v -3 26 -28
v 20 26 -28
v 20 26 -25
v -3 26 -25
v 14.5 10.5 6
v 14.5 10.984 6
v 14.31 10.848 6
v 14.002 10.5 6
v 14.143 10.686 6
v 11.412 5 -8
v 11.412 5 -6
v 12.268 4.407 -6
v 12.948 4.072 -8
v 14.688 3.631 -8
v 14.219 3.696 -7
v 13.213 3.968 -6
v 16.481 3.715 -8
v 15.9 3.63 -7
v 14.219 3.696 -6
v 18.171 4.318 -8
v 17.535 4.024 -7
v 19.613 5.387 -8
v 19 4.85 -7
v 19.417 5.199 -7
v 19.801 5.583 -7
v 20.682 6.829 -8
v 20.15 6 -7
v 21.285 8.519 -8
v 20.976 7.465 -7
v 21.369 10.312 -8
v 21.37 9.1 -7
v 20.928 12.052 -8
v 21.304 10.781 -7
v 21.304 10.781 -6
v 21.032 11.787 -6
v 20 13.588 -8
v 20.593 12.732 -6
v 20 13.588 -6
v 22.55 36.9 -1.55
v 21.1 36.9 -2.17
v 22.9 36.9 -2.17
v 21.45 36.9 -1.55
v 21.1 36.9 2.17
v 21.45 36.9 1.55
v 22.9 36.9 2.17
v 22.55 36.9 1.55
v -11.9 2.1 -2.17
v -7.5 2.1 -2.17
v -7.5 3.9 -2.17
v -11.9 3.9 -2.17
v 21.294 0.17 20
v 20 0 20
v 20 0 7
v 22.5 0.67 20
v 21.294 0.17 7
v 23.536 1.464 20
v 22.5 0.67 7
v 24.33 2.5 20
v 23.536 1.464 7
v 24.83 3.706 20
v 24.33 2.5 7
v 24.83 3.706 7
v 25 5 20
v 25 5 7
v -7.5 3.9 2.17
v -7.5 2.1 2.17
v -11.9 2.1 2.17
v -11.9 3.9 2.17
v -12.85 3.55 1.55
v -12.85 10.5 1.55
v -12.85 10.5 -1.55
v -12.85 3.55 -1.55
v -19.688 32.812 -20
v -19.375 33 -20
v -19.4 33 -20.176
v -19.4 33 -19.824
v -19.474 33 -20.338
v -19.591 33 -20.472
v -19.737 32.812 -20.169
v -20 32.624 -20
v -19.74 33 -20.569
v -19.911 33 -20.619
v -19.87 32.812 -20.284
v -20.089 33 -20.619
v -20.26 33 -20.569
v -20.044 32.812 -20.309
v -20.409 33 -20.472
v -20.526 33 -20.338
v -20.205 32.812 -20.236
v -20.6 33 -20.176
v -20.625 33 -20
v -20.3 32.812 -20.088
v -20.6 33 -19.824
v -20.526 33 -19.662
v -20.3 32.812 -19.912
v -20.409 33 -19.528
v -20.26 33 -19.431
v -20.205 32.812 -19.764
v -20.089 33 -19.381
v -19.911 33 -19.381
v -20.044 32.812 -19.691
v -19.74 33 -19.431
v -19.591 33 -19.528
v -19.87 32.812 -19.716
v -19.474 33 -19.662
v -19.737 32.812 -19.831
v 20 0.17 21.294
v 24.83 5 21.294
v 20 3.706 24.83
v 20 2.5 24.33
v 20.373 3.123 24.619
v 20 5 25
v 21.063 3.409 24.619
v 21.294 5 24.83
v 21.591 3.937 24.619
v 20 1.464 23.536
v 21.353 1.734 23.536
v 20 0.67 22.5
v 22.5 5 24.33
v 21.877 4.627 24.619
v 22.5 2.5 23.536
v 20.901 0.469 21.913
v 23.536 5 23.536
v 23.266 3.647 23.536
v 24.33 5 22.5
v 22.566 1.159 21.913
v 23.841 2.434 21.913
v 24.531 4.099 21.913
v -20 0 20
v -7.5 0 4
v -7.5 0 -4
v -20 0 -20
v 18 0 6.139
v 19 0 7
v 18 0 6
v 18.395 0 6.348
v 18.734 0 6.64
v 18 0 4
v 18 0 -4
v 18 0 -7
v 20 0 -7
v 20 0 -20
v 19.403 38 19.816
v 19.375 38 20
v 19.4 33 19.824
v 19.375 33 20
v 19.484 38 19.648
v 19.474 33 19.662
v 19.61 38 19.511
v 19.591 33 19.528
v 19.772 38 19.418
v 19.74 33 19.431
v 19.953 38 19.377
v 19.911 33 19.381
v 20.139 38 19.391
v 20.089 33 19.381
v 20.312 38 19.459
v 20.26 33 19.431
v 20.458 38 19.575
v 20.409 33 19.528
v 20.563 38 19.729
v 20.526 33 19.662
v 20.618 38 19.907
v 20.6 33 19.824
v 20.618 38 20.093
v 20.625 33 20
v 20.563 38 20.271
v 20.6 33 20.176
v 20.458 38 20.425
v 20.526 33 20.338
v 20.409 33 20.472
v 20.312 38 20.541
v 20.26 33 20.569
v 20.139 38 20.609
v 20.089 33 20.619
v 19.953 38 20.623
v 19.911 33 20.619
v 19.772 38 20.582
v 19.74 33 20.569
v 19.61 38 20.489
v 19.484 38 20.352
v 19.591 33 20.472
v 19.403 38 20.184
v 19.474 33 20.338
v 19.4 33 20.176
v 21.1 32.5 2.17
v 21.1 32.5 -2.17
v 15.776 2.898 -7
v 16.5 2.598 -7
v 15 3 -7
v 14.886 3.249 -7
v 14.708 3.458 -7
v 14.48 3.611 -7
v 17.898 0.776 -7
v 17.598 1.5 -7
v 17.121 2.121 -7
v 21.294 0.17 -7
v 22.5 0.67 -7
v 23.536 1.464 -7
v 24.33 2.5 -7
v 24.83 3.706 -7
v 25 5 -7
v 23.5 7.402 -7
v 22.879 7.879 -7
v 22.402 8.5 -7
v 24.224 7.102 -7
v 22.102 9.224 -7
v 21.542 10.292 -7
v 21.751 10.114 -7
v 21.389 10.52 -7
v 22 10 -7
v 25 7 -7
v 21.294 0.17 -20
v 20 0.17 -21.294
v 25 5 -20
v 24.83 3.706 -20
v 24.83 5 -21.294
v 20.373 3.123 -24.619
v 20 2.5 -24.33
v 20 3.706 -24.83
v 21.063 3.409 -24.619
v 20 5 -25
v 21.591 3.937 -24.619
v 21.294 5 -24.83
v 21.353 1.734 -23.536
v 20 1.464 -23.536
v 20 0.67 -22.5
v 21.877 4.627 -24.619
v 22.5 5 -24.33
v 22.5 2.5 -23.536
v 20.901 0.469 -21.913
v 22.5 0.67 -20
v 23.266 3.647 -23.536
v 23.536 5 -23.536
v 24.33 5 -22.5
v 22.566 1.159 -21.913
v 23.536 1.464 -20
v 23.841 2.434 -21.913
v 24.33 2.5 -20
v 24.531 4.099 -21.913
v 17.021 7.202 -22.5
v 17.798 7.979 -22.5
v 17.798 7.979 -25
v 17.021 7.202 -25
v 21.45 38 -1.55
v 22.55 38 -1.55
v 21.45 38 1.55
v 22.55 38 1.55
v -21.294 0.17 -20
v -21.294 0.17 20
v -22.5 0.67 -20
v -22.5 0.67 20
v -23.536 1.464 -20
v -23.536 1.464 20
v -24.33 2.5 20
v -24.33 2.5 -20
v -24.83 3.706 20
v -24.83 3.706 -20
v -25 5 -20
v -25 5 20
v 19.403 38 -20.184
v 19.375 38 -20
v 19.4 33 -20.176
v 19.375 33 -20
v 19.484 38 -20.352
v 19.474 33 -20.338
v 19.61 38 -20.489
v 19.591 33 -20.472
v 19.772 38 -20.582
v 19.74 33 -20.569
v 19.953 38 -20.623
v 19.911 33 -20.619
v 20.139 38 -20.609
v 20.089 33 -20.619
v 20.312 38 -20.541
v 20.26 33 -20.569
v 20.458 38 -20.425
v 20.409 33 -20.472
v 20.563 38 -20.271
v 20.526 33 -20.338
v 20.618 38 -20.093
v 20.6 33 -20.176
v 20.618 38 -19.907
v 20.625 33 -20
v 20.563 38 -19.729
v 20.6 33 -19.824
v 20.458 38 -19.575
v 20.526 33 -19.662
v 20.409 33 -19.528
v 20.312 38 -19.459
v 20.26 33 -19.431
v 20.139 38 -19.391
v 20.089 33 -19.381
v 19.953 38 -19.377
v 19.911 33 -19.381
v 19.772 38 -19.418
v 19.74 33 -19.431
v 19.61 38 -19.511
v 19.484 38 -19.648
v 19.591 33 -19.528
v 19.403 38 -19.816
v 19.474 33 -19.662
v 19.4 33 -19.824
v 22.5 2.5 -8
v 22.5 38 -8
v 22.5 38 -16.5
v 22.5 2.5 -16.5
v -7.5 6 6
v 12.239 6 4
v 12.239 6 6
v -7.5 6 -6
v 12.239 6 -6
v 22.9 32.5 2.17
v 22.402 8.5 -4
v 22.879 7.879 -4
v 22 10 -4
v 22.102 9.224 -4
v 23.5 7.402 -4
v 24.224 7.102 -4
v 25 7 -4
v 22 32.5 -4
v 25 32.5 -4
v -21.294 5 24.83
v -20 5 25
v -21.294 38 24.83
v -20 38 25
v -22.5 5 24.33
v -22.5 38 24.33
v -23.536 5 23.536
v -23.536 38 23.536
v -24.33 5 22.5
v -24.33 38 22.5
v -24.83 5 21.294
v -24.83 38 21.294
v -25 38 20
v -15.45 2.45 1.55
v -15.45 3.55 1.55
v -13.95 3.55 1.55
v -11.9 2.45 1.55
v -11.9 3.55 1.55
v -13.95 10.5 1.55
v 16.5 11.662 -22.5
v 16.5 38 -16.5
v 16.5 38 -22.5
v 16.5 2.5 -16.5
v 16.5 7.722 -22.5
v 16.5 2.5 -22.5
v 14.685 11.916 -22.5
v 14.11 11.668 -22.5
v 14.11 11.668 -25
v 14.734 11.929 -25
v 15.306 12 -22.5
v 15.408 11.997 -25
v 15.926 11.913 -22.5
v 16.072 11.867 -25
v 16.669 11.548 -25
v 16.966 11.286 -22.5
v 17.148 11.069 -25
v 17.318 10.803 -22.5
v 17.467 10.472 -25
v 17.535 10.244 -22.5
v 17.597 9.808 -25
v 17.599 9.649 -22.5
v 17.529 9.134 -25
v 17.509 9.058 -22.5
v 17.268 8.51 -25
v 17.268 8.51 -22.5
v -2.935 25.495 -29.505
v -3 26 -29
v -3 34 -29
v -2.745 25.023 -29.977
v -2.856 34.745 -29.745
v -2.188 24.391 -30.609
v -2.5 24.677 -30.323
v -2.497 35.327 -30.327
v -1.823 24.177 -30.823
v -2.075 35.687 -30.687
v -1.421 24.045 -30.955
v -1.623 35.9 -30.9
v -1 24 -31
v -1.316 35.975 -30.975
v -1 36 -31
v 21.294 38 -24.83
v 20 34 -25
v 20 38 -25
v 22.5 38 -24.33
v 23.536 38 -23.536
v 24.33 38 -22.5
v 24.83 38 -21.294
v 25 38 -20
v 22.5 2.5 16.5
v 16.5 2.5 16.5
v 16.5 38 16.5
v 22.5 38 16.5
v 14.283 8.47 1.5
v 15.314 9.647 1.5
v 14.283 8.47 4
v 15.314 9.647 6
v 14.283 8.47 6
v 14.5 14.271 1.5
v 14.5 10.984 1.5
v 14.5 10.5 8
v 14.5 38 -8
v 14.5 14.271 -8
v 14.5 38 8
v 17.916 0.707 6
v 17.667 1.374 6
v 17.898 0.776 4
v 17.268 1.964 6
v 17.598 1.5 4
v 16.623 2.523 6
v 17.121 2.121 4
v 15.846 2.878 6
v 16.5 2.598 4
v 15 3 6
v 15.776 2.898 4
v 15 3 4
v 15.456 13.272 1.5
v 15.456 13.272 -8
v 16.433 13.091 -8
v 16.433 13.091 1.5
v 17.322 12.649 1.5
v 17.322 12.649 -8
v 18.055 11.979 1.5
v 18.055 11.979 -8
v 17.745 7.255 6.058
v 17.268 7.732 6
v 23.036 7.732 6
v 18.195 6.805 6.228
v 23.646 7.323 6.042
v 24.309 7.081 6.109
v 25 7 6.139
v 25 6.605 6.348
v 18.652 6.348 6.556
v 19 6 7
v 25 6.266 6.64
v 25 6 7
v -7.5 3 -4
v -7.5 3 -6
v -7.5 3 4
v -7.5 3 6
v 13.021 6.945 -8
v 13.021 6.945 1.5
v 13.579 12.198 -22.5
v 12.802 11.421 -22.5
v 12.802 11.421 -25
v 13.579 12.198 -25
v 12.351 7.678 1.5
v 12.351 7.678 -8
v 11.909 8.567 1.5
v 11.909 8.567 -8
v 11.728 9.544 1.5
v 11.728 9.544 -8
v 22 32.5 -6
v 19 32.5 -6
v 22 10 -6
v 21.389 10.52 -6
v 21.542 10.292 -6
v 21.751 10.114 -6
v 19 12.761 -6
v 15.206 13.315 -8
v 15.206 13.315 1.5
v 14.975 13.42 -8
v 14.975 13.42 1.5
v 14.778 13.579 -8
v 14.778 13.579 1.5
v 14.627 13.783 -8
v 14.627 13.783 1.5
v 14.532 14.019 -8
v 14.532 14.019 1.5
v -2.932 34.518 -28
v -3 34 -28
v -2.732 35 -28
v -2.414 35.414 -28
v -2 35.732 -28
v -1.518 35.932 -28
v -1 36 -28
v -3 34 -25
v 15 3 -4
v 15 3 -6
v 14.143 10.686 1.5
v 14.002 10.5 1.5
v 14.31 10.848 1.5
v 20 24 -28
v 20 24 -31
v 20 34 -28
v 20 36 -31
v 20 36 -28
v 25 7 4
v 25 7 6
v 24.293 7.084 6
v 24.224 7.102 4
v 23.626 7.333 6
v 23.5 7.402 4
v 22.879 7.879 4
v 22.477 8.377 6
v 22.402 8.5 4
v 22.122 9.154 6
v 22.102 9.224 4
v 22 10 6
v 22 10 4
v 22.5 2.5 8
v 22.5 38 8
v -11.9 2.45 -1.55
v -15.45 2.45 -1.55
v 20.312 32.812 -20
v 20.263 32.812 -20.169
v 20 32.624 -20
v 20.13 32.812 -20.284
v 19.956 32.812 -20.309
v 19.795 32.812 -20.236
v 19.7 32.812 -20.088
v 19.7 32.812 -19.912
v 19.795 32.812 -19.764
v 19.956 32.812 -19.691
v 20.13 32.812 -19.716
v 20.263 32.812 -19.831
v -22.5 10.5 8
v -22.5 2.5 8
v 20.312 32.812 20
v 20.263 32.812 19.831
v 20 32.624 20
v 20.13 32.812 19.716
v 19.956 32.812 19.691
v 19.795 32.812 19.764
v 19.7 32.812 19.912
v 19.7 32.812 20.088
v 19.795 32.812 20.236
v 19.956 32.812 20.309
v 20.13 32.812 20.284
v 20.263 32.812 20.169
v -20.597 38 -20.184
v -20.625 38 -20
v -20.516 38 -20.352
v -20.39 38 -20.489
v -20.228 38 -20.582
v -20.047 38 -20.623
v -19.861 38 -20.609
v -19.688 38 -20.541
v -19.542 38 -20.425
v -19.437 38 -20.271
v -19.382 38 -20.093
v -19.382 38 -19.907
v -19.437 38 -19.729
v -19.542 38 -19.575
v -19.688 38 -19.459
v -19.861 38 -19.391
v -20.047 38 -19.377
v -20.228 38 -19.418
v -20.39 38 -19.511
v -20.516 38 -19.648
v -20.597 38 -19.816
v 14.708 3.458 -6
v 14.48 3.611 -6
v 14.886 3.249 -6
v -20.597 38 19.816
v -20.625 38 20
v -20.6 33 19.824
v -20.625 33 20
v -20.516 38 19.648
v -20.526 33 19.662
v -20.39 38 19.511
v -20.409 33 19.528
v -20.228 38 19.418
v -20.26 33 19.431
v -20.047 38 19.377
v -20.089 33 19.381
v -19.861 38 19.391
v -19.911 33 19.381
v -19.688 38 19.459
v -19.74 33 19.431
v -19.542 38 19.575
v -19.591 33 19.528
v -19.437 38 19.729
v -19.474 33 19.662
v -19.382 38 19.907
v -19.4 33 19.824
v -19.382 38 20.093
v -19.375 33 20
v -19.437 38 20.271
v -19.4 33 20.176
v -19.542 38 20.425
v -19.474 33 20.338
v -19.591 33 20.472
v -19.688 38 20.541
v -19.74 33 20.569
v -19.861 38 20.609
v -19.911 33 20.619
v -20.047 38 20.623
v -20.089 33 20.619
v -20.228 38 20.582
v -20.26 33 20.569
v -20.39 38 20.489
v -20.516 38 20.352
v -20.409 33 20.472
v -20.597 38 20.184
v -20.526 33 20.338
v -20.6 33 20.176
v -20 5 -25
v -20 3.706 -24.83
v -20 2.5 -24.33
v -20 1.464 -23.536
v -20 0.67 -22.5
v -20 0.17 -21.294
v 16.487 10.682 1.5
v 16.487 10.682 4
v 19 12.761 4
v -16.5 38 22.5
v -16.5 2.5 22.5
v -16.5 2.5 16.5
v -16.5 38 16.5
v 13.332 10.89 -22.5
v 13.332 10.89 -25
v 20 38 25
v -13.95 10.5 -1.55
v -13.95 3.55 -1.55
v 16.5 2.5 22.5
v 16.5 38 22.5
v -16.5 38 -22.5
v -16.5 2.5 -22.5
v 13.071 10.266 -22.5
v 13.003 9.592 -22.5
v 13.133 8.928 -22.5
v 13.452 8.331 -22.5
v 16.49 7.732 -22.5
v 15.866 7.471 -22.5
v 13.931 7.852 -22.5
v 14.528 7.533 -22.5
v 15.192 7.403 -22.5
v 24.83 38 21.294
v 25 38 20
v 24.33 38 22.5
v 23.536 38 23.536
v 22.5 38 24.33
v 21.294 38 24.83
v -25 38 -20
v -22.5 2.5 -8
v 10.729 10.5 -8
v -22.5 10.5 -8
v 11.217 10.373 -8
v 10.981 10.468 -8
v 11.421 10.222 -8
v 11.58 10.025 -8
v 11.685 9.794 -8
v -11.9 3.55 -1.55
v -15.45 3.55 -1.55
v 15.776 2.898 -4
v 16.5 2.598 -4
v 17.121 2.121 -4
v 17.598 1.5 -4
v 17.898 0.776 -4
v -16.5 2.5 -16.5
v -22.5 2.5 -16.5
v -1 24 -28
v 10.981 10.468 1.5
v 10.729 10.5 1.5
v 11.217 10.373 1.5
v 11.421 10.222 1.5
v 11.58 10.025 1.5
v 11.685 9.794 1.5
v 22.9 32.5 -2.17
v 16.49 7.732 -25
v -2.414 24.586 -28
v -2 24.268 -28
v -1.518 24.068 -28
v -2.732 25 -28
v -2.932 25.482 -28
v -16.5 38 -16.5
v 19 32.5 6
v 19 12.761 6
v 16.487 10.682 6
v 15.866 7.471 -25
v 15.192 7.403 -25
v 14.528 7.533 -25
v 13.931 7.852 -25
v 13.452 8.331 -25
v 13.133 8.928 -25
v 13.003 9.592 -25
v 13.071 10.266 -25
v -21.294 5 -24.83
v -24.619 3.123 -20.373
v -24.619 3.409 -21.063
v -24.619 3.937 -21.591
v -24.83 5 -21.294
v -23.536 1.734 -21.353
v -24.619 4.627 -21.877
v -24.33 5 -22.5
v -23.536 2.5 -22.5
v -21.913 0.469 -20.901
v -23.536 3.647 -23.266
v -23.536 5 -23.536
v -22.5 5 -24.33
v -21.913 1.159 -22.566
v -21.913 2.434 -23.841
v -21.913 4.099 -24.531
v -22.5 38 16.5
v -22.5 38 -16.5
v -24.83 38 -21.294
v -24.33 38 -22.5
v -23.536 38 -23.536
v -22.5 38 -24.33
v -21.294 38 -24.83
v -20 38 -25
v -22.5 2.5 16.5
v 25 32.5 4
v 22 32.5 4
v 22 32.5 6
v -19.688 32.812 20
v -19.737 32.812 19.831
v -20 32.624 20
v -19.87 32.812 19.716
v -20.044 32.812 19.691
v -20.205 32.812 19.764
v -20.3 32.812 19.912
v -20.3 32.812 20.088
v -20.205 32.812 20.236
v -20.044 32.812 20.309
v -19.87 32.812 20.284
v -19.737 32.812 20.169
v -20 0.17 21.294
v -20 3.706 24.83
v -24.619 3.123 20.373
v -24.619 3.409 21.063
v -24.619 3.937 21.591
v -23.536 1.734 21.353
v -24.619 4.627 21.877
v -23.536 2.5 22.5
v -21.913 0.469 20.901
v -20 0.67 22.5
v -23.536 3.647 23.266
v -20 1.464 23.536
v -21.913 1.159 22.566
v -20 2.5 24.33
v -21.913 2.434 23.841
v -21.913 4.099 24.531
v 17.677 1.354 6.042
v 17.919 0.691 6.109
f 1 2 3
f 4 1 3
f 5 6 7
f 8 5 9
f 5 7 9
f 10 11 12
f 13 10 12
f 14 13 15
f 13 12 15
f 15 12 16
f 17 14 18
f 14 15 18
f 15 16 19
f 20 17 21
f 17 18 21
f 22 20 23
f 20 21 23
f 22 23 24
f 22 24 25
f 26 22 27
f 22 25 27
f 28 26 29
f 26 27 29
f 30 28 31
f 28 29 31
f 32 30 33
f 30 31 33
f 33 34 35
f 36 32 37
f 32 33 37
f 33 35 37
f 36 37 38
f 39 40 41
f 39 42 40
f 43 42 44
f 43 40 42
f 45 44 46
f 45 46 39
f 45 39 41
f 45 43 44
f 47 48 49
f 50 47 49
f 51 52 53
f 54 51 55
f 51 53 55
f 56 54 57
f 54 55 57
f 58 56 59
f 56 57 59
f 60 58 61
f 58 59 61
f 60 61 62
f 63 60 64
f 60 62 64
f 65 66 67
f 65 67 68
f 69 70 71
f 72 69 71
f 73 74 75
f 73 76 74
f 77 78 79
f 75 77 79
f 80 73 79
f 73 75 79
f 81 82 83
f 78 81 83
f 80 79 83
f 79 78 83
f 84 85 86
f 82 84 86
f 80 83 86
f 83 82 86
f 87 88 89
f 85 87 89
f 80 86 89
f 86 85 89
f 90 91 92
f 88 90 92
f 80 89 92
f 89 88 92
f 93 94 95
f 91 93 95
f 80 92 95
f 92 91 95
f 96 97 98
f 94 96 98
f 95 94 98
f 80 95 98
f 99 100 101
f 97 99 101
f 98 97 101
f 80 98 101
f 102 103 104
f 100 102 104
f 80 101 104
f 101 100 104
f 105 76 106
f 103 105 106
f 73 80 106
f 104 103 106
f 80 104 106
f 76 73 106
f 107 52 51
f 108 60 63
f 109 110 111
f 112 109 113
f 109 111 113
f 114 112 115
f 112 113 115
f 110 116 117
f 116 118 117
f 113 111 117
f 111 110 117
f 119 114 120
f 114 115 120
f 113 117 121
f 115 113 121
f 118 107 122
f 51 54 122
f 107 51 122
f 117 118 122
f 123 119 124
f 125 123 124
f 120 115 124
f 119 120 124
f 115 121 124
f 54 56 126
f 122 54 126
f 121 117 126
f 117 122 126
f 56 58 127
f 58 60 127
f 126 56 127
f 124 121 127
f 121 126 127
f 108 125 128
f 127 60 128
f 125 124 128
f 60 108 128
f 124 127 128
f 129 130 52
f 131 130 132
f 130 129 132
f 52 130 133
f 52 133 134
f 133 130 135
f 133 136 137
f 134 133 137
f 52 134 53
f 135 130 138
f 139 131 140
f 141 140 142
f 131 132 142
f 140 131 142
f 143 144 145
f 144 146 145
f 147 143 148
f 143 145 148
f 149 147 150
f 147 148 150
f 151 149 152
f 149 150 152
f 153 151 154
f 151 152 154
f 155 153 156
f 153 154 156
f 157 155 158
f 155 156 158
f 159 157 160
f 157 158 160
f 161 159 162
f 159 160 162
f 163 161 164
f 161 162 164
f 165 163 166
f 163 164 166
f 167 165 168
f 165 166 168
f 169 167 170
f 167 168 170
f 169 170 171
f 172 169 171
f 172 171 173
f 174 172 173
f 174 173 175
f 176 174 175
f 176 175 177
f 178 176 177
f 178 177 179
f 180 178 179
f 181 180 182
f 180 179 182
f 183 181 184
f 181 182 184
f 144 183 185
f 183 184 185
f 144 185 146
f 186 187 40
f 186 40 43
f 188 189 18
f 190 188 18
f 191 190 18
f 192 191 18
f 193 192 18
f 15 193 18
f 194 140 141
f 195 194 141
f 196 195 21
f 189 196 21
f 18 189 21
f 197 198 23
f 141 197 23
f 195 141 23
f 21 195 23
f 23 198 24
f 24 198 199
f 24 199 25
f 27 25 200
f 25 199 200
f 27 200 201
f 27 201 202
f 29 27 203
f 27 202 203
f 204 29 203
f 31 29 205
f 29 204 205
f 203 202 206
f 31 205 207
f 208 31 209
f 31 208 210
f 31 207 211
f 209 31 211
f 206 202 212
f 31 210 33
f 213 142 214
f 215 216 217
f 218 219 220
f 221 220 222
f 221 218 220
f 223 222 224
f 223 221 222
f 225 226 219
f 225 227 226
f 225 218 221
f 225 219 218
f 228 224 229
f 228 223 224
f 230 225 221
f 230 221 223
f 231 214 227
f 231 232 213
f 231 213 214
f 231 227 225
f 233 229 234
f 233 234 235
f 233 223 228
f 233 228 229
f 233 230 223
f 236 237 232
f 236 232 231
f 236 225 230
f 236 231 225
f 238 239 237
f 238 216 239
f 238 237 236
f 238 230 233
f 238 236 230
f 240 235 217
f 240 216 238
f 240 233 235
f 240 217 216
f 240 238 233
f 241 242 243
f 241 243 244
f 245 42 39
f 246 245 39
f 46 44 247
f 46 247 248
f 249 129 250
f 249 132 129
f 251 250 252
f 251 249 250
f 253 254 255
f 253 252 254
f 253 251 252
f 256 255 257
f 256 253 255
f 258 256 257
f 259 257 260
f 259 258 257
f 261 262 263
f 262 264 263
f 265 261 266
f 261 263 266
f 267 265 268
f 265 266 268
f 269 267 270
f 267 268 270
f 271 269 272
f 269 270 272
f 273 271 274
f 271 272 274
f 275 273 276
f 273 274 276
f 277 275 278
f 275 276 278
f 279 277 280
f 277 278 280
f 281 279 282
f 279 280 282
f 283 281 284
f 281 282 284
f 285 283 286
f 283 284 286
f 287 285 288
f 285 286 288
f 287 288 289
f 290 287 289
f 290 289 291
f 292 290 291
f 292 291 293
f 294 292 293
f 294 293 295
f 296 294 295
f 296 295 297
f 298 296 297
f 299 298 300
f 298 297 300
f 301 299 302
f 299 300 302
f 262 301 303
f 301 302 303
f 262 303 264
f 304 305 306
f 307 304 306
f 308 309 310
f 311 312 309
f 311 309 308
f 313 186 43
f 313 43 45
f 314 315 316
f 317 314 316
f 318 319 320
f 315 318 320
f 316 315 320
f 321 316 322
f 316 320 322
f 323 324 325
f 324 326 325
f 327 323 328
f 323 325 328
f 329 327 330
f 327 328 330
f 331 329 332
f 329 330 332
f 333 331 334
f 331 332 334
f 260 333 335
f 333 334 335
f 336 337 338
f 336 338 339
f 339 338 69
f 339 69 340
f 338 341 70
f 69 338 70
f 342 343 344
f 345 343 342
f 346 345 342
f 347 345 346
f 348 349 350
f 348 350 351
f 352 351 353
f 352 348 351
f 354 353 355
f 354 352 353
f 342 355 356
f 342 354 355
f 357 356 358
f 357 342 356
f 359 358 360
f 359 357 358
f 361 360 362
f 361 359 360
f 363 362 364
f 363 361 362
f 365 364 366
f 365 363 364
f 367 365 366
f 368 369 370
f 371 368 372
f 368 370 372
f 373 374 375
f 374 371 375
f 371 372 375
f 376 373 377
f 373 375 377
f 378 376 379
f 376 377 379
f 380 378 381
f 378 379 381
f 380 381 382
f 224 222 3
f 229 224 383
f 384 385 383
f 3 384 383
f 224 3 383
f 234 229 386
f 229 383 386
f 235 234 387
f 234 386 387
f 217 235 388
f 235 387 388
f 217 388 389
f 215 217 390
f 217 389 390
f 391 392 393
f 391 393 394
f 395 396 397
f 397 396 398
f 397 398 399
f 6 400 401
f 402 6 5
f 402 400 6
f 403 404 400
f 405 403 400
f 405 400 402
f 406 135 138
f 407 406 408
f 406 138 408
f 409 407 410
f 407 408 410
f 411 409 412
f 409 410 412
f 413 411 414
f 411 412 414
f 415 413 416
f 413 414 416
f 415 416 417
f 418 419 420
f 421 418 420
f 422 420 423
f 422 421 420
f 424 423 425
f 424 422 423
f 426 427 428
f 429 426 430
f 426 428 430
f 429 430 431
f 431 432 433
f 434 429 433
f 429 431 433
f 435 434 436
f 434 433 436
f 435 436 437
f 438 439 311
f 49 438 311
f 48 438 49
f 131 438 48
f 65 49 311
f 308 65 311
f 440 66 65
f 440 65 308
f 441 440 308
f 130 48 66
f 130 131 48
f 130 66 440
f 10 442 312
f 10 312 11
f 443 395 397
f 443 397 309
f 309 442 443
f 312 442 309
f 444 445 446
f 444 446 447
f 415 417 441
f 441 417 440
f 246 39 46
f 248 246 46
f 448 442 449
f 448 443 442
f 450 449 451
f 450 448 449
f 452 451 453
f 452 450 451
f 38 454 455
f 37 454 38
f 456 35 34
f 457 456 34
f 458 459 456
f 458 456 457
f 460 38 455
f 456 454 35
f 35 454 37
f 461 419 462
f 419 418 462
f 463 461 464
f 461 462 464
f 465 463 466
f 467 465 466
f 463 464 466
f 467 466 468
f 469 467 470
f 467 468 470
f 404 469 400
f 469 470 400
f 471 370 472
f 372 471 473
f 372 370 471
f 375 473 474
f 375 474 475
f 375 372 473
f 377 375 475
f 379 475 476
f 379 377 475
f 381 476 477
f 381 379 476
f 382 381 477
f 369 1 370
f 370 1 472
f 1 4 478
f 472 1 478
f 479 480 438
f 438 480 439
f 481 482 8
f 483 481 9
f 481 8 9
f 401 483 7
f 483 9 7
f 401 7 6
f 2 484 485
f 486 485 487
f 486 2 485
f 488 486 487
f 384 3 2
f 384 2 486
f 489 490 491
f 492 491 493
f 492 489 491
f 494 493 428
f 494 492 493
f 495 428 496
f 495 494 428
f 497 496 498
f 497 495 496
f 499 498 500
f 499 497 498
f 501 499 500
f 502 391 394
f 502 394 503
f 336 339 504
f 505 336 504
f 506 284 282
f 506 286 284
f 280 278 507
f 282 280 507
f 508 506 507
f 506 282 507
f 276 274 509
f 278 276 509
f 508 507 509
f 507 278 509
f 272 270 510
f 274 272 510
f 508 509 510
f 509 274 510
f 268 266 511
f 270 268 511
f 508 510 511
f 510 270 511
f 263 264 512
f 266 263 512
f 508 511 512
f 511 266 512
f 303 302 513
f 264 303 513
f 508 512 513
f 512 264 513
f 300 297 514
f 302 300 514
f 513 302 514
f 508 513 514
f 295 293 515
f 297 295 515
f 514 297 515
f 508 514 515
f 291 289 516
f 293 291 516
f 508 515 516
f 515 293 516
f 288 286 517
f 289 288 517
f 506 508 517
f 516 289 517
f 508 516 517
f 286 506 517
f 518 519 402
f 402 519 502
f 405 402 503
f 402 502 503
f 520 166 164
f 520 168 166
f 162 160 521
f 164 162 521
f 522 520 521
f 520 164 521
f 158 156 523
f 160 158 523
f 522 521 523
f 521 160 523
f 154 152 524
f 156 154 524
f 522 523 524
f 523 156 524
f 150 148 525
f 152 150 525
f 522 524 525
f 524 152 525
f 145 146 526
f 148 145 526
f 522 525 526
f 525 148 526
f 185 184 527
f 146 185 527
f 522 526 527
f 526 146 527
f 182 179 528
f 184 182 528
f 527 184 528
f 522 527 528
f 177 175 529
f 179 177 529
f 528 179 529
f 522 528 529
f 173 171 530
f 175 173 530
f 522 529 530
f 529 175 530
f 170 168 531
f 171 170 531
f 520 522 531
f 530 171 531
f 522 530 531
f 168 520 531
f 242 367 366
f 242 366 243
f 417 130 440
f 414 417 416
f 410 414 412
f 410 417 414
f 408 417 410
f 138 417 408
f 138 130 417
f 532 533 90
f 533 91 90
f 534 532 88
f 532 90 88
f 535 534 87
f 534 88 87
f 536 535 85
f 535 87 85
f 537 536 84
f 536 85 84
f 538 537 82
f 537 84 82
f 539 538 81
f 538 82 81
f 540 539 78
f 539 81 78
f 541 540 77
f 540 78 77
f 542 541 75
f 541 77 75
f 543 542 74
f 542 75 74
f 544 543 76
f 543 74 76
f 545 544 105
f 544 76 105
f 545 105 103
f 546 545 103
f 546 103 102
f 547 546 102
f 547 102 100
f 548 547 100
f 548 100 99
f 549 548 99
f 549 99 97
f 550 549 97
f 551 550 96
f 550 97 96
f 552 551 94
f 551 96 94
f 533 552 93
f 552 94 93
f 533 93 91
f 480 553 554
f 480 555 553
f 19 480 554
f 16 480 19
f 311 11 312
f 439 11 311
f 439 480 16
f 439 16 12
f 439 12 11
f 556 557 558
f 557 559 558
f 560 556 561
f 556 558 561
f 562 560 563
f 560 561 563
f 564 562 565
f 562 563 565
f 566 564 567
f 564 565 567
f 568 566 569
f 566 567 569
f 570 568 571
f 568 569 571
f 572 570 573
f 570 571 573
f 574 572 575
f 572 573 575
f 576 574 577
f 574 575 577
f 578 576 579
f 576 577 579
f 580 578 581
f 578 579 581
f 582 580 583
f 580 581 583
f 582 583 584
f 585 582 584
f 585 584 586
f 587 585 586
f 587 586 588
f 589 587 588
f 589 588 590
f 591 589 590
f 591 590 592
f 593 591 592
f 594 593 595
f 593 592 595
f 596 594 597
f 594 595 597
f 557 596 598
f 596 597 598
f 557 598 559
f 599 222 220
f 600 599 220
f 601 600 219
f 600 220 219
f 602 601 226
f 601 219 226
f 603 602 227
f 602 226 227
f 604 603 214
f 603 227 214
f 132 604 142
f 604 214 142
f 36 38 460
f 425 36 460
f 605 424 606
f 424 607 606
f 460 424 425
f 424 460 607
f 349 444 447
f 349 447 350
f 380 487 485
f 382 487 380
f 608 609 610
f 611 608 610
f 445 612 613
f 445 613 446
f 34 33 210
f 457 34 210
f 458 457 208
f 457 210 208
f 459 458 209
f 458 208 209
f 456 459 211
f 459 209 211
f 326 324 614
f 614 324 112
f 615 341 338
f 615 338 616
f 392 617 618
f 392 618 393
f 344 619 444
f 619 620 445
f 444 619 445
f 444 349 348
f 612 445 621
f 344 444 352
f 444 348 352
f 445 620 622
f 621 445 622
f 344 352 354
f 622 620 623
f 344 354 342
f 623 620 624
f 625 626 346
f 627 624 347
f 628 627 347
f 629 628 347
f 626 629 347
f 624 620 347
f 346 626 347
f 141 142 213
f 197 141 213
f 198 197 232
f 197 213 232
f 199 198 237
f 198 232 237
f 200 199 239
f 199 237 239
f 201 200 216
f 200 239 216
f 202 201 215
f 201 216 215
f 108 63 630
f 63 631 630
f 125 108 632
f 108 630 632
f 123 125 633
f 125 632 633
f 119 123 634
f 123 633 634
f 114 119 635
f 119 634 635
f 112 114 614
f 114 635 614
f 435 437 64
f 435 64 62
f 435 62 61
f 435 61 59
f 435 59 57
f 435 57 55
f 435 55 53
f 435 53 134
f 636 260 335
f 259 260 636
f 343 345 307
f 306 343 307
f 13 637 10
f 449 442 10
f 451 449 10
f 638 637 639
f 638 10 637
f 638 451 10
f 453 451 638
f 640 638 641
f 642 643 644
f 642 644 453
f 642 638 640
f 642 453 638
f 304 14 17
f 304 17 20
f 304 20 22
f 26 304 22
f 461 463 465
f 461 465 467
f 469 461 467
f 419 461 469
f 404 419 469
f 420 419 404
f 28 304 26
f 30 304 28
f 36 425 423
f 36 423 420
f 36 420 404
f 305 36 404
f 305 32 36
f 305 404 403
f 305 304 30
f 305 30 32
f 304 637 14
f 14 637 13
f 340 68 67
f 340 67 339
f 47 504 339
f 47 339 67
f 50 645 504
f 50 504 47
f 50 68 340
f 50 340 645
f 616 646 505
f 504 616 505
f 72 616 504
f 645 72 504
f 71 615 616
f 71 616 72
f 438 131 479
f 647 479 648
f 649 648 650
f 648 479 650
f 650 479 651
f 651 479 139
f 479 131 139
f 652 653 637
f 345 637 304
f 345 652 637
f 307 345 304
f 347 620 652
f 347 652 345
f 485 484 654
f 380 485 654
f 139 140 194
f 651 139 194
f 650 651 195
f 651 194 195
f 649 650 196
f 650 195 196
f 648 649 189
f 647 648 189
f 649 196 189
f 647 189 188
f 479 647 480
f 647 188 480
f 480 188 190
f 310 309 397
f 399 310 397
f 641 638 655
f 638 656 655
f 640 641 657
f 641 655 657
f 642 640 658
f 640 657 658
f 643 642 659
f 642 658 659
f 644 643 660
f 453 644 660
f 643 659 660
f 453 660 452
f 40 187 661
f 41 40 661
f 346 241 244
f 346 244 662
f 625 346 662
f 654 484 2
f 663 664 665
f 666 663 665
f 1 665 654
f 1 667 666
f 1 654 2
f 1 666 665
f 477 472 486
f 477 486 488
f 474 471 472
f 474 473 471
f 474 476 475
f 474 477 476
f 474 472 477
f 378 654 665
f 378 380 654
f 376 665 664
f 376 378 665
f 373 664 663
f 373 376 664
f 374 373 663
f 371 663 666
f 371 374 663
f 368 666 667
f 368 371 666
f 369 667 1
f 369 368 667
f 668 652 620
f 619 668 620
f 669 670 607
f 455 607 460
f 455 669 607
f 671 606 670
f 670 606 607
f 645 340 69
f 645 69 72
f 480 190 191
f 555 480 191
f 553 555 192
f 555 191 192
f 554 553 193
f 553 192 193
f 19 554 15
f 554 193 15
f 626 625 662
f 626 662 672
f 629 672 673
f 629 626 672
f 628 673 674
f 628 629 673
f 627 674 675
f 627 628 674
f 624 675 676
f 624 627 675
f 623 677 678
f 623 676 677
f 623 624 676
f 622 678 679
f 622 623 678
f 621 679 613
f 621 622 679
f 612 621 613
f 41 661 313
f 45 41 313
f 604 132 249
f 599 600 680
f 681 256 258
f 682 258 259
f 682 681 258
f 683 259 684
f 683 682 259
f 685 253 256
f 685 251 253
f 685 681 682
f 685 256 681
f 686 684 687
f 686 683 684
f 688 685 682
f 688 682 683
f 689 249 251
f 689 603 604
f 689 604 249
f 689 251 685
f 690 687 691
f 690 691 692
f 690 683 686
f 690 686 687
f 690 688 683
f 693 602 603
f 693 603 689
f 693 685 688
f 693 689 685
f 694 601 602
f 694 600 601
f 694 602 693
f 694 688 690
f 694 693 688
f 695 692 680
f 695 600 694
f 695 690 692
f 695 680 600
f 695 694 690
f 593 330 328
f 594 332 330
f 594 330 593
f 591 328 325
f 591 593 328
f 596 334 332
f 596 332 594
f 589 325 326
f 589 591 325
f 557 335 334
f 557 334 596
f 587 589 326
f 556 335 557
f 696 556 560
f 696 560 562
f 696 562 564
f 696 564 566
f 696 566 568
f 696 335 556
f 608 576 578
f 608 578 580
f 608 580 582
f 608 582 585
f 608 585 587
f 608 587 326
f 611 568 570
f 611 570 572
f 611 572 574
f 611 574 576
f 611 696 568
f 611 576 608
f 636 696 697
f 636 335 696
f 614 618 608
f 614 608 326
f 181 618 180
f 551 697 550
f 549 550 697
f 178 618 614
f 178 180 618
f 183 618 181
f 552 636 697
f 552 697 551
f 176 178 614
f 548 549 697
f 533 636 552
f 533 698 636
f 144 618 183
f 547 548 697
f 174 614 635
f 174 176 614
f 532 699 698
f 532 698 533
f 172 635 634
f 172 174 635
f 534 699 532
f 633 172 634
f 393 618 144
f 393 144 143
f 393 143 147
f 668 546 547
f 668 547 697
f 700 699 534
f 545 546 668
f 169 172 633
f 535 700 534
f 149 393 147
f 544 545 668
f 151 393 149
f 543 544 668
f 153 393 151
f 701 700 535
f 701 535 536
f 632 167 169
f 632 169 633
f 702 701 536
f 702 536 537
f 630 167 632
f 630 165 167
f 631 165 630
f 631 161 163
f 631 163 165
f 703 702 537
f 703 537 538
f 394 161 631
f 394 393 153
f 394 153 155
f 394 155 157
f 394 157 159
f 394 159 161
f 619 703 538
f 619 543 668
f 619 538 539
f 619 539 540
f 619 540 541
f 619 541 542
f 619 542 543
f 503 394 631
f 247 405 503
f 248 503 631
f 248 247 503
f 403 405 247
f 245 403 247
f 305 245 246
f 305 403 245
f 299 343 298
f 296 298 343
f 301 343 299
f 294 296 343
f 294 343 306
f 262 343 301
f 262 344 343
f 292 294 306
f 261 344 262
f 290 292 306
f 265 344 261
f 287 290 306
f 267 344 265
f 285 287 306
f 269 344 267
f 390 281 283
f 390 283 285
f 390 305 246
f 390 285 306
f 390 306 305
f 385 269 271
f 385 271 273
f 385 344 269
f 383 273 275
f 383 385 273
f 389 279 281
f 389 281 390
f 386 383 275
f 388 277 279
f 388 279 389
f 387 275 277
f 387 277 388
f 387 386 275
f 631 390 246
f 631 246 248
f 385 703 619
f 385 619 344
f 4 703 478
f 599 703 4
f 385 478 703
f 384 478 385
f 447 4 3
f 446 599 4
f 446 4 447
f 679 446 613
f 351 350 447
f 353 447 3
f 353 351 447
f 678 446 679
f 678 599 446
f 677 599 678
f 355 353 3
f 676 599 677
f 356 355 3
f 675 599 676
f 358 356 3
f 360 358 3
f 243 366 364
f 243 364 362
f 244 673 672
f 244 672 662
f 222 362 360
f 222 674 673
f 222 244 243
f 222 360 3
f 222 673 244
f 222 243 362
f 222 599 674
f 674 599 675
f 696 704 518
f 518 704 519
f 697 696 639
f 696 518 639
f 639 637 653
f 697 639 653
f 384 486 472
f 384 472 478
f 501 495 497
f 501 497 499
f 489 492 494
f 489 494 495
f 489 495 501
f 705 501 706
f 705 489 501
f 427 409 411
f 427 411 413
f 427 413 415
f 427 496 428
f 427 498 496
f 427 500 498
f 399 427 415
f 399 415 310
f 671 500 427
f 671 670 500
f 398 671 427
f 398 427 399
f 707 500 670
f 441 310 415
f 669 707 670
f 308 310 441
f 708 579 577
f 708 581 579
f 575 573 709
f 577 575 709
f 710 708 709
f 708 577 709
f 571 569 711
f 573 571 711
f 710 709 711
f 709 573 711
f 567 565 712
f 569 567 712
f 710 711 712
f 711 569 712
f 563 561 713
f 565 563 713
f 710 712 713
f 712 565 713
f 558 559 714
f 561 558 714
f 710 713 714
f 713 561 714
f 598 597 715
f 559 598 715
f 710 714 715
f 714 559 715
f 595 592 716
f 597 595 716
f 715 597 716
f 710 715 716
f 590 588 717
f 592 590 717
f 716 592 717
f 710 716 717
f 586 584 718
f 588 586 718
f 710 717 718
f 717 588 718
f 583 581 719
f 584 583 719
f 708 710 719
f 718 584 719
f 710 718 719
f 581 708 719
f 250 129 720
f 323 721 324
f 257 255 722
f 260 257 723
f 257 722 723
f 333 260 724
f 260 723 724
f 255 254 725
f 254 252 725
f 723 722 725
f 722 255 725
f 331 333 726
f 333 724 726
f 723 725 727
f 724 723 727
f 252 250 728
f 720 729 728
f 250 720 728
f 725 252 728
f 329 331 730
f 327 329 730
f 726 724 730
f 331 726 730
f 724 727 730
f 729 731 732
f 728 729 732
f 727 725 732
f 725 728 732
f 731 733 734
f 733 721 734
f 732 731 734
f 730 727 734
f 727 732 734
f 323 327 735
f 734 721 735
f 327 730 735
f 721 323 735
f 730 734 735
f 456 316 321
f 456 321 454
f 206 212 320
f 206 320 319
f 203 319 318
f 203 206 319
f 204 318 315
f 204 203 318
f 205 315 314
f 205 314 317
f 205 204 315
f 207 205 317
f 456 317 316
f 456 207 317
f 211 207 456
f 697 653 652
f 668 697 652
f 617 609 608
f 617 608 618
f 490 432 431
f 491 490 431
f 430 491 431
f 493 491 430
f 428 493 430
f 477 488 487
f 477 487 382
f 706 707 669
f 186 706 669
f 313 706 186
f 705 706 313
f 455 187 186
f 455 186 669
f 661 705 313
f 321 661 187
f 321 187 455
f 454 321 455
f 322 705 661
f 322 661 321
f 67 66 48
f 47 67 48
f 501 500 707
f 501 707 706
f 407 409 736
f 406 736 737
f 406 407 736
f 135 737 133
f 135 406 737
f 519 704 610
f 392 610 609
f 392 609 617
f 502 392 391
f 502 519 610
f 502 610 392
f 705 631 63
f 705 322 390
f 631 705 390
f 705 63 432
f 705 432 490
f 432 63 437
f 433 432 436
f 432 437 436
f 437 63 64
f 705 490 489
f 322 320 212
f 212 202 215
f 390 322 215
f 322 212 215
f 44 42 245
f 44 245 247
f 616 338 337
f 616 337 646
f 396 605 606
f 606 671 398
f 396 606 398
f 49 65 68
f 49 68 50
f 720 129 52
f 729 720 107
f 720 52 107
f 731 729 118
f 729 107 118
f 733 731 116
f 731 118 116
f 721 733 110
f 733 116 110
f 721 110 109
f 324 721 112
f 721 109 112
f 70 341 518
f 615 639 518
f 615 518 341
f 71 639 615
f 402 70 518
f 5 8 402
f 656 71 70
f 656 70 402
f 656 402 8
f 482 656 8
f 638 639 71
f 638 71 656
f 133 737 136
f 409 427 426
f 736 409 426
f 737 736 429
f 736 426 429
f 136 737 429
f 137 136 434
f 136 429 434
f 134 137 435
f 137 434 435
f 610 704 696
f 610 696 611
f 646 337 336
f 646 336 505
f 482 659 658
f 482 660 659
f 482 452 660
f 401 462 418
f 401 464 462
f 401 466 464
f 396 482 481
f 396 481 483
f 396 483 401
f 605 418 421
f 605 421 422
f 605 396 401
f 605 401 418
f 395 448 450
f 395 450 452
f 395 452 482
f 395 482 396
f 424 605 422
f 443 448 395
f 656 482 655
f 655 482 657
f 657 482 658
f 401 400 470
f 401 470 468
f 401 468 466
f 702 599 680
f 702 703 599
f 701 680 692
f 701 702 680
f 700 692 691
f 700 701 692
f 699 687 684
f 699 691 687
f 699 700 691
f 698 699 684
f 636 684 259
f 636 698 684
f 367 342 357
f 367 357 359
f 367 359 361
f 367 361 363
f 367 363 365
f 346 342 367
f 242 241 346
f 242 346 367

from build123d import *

# Parameters (mm, degrees)
SKETCH1_W                = 50
SKETCH1_H                = 50
BOSS_EXTRUDE1_DEPTH      = 38
SHELL1_T                 = -2.5
SKETCH3_W                = 45
SKETCH3_H                = 16
BOSS_EXTRUDE3_DEPTH      = 8
SKETCH4_W                = 32.5
SKETCH4_H                = 8
CUT_EXTRUDE1_DEPTH       = 3
SKETCH7_W                = 32.5
SKETCH7_H                = 12
CUT_EXTRUDE2_DEPTH       = 3
SKETCH8_W                = 16
SKETCH8_H                = 27.5
BOSS_EXTRUDE4_DEPTH      = 8
SKETCH9_W                = 8
SKETCH9_H                = 32.5
CUT_EXTRUDE3_DEPTH       = 3
CUT_EXTRUDE5_DEPTH       = 3
CUT_EXTRUDE7_DEPTH       = 10
CUT_EXTRUDE7_DEPTH_BACK  = 2
SKETCH13_W               = 3
SKETCH13_H               = 3.011524732
FILLET1_R                = 5
SKETCH16_R               = 2.3
CUT_EXTRUDE8_DEPTH       = 53.642663306
SKETCH17_W               = 23
SKETCH17_H               = 12
BOSS_EXTRUDE5_DEPTH      = 6
SKETCH18_W               = 3
SKETCH18_H               = 2
CUT_EXTRUDE9_DEPTH       = 57.471231614
CUT_EXTRUDE12_DEPTH      = 2
CUT_EXTRUDE13_DEPTH      = 2
CUT_EXTRUDE14_DEPTH      = 16
CUT_EXTRUDE10_START      = -19.5
CUT_EXTRUDE10_DEPTH      = 19.5
FILLET4_R                = 2
CUT_EXTRUDE18_DEPTH      = 13
CUT_EXTRUDE18_DEPTH_BACK = 1
SKETCH26_W               = 6
SKETCH26_H               = 6
BOSS_EXTRUDE6_DEPTH      = 4.5
SKETCH30_W               = 4.34
SKETCH30_H               = 1.8
CUT_EXTRUDE19_DEPTH      = 4.4
SKETCH31_W               = 1.8
SKETCH31_H               = 4.34
CUT_EXTRUDE20_DEPTH      = 4.4
SKETCH32_W               = 1.1
SKETCH32_H               = 3.1
CUT_EXTRUDE21_DEPTH      = 55.291896265
SKETCH33_W               = 3.1
SKETCH33_H               = 1.1
CUT_EXTRUDE22_DEPTH      = 3.55
SKETCH34_W               = 1.1
SKETCH34_H               = 3.1
CUT_EXTRUDE23_DEPTH      = 7.3
CUT_EXTRUDE26_DEPTH      = 2
SKETCH45_R               = 3.575
CUT_EXTRUDE27_DEPTH      = 20
FILLET8_R                = 2
SKETCH46_W               = 1.850257739
SKETCH46_H               = 4
SKETCH46_W_2             = 4
SKETCH46_H_2             = 1.850257739
CUT_EXTRUDE28_DEPTH      = 1
CUT_EXTRUDE25_START      = -3
CUT_EXTRUDE25_DEPTH      = 3
CUT_EXTRUDE24_START      = -3
CUT_EXTRUDE24_DEPTH      = 3
FILLET9_R                = 1
FILLET10_R               = 1
SKETCH47_W               = 6
SKETCH47_H               = 6
BOSS_EXTRUDE7_DEPTH      = 35.5
M1_6_TAPPED_HOLE1_D      = 1.25
M1_6_TAPPED_HOLE1_DEPTH  = 5
M1_6_TAPPED_HOLE1_TIP    = 0.375537887


with BuildPart() as part:
    # Sketch1 → Boss-Extrude1 (new body)
    with BuildSketch(Plane(origin=(0, 0, 0), x_dir=(1, 0, 0), z_dir=(0, 1, 0))):
        Rectangle(SKETCH1_W, SKETCH1_H)
    extrude(amount=BOSS_EXTRUDE1_DEPTH)

    # Shell1
    shell1_openings = [part.faces().sort_by_distance(p)[0] for p in [
        (0, 38, 0),
    ]]
    offset(amount=SHELL1_T, openings=shell1_openings, kind=Kind.INTERSECTION)

    # Sketch3 → Boss-Extrude3 (add)
    with BuildSketch(Plane(origin=(0, 2.5, 0), x_dir=(1, 0, 0), z_dir=(0, 1, 0))):
        Rectangle(SKETCH3_W, SKETCH3_H)
    extrude(amount=BOSS_EXTRUDE3_DEPTH)

    # Sketch4 → Cut-Extrude1 (cut)
    with BuildSketch(Plane.XZ):
        with Locations((8.75, 0)):
            Rectangle(SKETCH4_W, SKETCH4_H)
    extrude(amount=-CUT_EXTRUDE1_DEPTH, mode=Mode.SUBTRACT)

    # Sketch7 → Cut-Extrude2 (cut)
    with BuildSketch(Plane(origin=(0, 3, 0), x_dir=(-1, 0, 0), z_dir=(0, -1, 0))):
        with Locations((-8.75, 0)):
            Rectangle(SKETCH7_W, SKETCH7_H)
    extrude(amount=-CUT_EXTRUDE2_DEPTH, mode=Mode.SUBTRACT)

    # Sketch8 → Boss-Extrude4 (add)
    with BuildSketch(Plane.ZY.offset(-22.5)):
        with Locations((0, 24.25)):
            Rectangle(SKETCH8_W, SKETCH8_H)
    extrude(amount=BOSS_EXTRUDE4_DEPTH)

    # Sketch9 → Cut-Extrude3 (cut)
    with BuildSketch(Plane(origin=(25, 0, 0), x_dir=(0, 0, -1), z_dir=(1, 0, 0))):
        with Locations((0, 16.25)):
            Rectangle(SKETCH9_W, SKETCH9_H)
    extrude(amount=-CUT_EXTRUDE3_DEPTH, mode=Mode.SUBTRACT)

    # Sketch10 → Cut-Extrude5 (cut)
    with BuildSketch(Plane(origin=(22, 0, 0), x_dir=(0, 0, -1), z_dir=(1, 0, 0))):
        Polygon((-6, 32.5), (-6, 0), (6, 0), (6, 3), (6, 32.5), align=None)
    extrude(amount=-CUT_EXTRUDE5_DEPTH, mode=Mode.SUBTRACT)

    # Sketch13 → Cut-Extrude7 (cut, two sides: drawn at the far end of the back side and taken through both)
    with BuildSketch(Plane(origin=(0, 0, 4), x_dir=(-1, 0, 0), z_dir=(0, 0, -1)).offset(-CUT_EXTRUDE7_DEPTH_BACK)):
        with Locations((-23.5, 1.505762366)):
            Rectangle(SKETCH13_W, SKETCH13_H)
    extrude(amount=CUT_EXTRUDE7_DEPTH + CUT_EXTRUDE7_DEPTH_BACK, mode=Mode.SUBTRACT)

    # Fillet1
    fillet1_edges = [part.edges().sort_by_distance(p)[0] for p in [
        (25, 0, -15.5),
        (0, 0, -25),
        (25, 0, 15.5),
        (0, 0, 25),
        (-25, 0, 0),
        (-25, 19, -25),
        (25, 19, -25),
        (25, 19, 25),
        (-25, 19, 25),
    ]]
    fillet(fillet1_edges, radius=FILLET1_R)

    # Sketch16 → Cut-Extrude8 (cut, through all)
    with BuildSketch(Plane(origin=(0, 0, 1.5), x_dir=(-1, 0, 0), z_dir=(0, 0, -1))):
        with Locations(Location((-15.3, 9.7, 0), (0, 0, 180))):
            Circle(SKETCH16_R)
    extrude(amount=CUT_EXTRUDE8_DEPTH, mode=Mode.SUBTRACT)

    # Sketch17 → Boss-Extrude5 (add)
    with BuildSketch(Plane(origin=(0, 0, -25), x_dir=(-1, 0, 0), z_dir=(0, 0, -1))):
        with Locations((-8.5, 30)):
            Rectangle(SKETCH17_W, SKETCH17_H)
    extrude(amount=BOSS_EXTRUDE5_DEPTH)

    # Sketch18 → Cut-Extrude9 (cut, through all)
    with BuildSketch(Plane.ZY.offset(3)):
        with Locations((-26.5, 25)):
            Rectangle(SKETCH18_W, SKETCH18_H)
        with Locations((-26.5, 35)):
            Rectangle(SKETCH18_W, SKETCH18_H)
    extrude(amount=-CUT_EXTRUDE9_DEPTH, mode=Mode.SUBTRACT)

    # Sketch20 → Cut-Extrude12 (cut)
    with BuildSketch(Plane(origin=(0, 0, 4), x_dir=(-1, 0, 0), z_dir=(0, 0, -1))):
        with BuildLine():
            Line((-22, 10), (-22, 7))
            Line((-22, 7), (-22, 6))
            Line((-22, 6), (-24, 6))
            Line((-24, 6), (-25, 6))
            Line((-25, 6), (-25, 7))
            ThreePointArc((-25, 7), (-22.878679656, 7.878679656), (-22, 10))
        make_face()
    extrude(amount=-CUT_EXTRUDE12_DEPTH, mode=Mode.SUBTRACT)

    # Sketch21 → Cut-Extrude13 (cut)
    with BuildSketch(Plane(origin=(0, 0, 4), x_dir=(-1, 0, 0), z_dir=(0, 0, -1))):
        with BuildLine():
            Line((-19, 3), (-19, 0))
            Line((-19, 0), (-18, 0))
            ThreePointArc((-18, 0), (-17.121320344, 2.121320344), (-15, 3))
            Line((-15, 3), (-19, 3))
        make_face()
    extrude(amount=-CUT_EXTRUDE13_DEPTH, mode=Mode.SUBTRACT)

    # Sketch22 → Cut-Extrude14 (cut)
    with BuildSketch(Plane(origin=(0, 0, 4), x_dir=(-1, 0, 0), z_dir=(0, 0, -1))):
        with BuildLine():
            Line((-15.3, 9.7), (-11.411555581, 5))
            ThreePointArc((-11.411555581, 5), (-19.613351365, 5.386648635), (-20, 13.588444419))
            Line((-20, 13.588444419), (-15.3, 9.7))
        make_face()
    extrude(amount=CUT_EXTRUDE14_DEPTH, mode=Mode.SUBTRACT)

    # Sketch19 → Cut-Extrude10 (cut)
    with BuildSketch(Plane(origin=(0, 0, -25), x_dir=(-1, 0, 0), z_dir=(0, 0, -1)).offset(CUT_EXTRUDE10_START)):
        with BuildLine():
            ThreePointArc((-16.49025244, 7.731930101), (-16.926345597, 8.073654403), (-17.268069899, 8.50974756))
            Line((-17.268069899, 8.50974756), (-17.798399985, 7.979417474))
            Line((-17.798399985, 7.979417474), (-17.020582526, 7.201600015))
            Line((-17.020582526, 7.201600015), (-16.49025244, 7.731930101))
        make_face()
        with BuildLine():
            ThreePointArc((-14.10974756, 11.668069899), (-13.673654403, 11.326345597), (-13.331930101, 10.89025244))
            Line((-13.331930101, 10.89025244), (-12.801600015, 11.420582526))
            Line((-12.801600015, 11.420582526), (-13.579417474, 12.198399985))
            Line((-13.579417474, 12.198399985), (-14.10974756, 11.668069899))
        make_face()
    extrude(amount=CUT_EXTRUDE10_DEPTH, mode=Mode.SUBTRACT)

    # Fillet4
    fillet4_edges = [part.edges().sort_by_distance(p)[0] for p in [
        (-3, 36, -29.5),
        (-3, 24, -29.5),
        (-3, 30, -31),
    ]]
    fillet(fillet4_edges, radius=FILLET4_R)

    # Sketch26 → Cut-Extrude18 (cut, two sides: drawn at the far end of the back side and taken through both)
    with BuildSketch(Plane(origin=(0, 0, 6), x_dir=(-1, 0, 0), z_dir=(0, 0, -1)).offset(-CUT_EXTRUDE18_DEPTH_BACK)):
        with Locations((-22, 3)):
            Rectangle(SKETCH26_W, SKETCH26_H)
    extrude(amount=CUT_EXTRUDE18_DEPTH + CUT_EXTRUDE18_DEPTH_BACK, mode=Mode.SUBTRACT)

    # Sketch29 → Boss-Extrude6 (add)
    with BuildSketch(Plane(origin=(0, 0, 6), x_dir=(-1, 0, 0), z_dir=(0, 0, -1))):
        with BuildLine():
            Line((-16.487340596, 10.682320832), (-15.313754074, 9.647314806))
            Line((-15.313754074, 9.647314806), (-14.282640056, 8.470307295))
            ThreePointArc((-14.282640056, 8.470307295), (-14.205455569, 10.751949236), (-16.487340596, 10.682320832))
        make_face()
    extrude(amount=BOSS_EXTRUDE6_DEPTH)

    # Sketch30 → Cut-Extrude19 (cut)
    with BuildSketch(Plane(origin=(-7.5, 0, 0), x_dir=(0, 0, -1), z_dir=(1, 0, 0))):
        with Locations((0, 3)):
            Rectangle(SKETCH30_W, SKETCH30_H)
    extrude(amount=-CUT_EXTRUDE19_DEPTH, mode=Mode.SUBTRACT)

    # Sketch31 → Cut-Extrude20 (cut)
    with BuildSketch(Plane.XZ.offset(-32.5)):
        with Locations((22, 0)):
            Rectangle(SKETCH31_W, SKETCH31_H)
    extrude(amount=-CUT_EXTRUDE20_DEPTH, mode=Mode.SUBTRACT)

    # Sketch32 → Cut-Extrude21 (cut, through all)
    with BuildSketch(Plane.XZ.offset(-36.9)):
        with Locations((22, 0)):
            Rectangle(SKETCH32_W, SKETCH32_H)
    extrude(amount=-CUT_EXTRUDE21_DEPTH, mode=Mode.SUBTRACT)

    # Sketch33 → Cut-Extrude22 (cut)
    with BuildSketch(Plane(origin=(-11.9, 0, 0), x_dir=(0, 0, -1), z_dir=(1, 0, 0))):
        with Locations((0, 3)):
            Rectangle(SKETCH33_W, SKETCH33_H)
    extrude(amount=-CUT_EXTRUDE22_DEPTH, mode=Mode.SUBTRACT)

    # Sketch34 → Cut-Extrude23 (cut)
    with BuildSketch(Plane(origin=(0, 10.5, 0), x_dir=(1, 0, 0), z_dir=(0, 1, 0))):
        with Locations((-13.4, 0)):
            Rectangle(SKETCH34_W, SKETCH34_H)
    extrude(amount=-CUT_EXTRUDE23_DEPTH, mode=Mode.SUBTRACT)

    # Sketch44 → Cut-Extrude26 (cut)
    with BuildSketch(Plane(origin=(0, 0, 4), x_dir=(-1, 0, 0), z_dir=(0, 0, -1))):
        Polygon((-19, 12.761115819), (-19, 6), (-12.238884181, 6), (-14.282640056, 8.470307295), (-15.313754074, 9.647314806), (-16.487340596, 10.682320832), align=None)
    extrude(amount=-CUT_EXTRUDE26_DEPTH, mode=Mode.SUBTRACT)

    # Sketch45 → Cut-Extrude27 (cut)
    with BuildSketch(Plane(origin=(0, 0, 1.5), x_dir=(-1, 0, 0), z_dir=(0, 0, -1))):
        with Locations((-15.3, 9.7)):
            Circle(SKETCH45_R)
    extrude(amount=CUT_EXTRUDE27_DEPTH, mode=Mode.SUBTRACT)

    # Fillet8
    # the kernel refuses this fillet: 2 mm, written as the material it takes off along each edge
    with BuildSketch(Plane(origin=(19, 6, 6), x_dir=(-1, 0, 0), z_dir=(0, -1, 0))) as fillet8_piece_1_section:
        with BuildLine():
            CenterArc((1.732050808, -2), FILLET8_R, 90, 60)
            Line((0, -1), (0, 0))
            Line((0, 0), (1.732050808, 0))
        make_face()
    fillet8_piece_1 = extrude(amount=10.330127019, mode=Mode.PRIVATE)
    fillet8_piece_1 = fillet8_piece_1 - Plane(origin=(15, 0, 6), x_dir=(1, 0, 0), z_dir=(0, 0, -1)) * Cylinder(3, 28, mode=Mode.PRIVATE)
    add(fillet8_piece_1, mode=Mode.SUBTRACT)
    with BuildSketch(Plane(origin=(29.330127019, 6, 6), x_dir=(0, 1, 0), z_dir=(-1, 0, 0))) as fillet8_piece_2_section:
        with BuildLine():
            CenterArc((1.732050808, -2), FILLET8_R, 90, 60)
            Line((0, -1), (0, 0))
            Line((0, 0), (1.732050808, 0))
        make_face()
    fillet8_piece_2 = extrude(amount=10.330127019, mode=Mode.PRIVATE)
    fillet8_piece_2 = fillet8_piece_2 - Plane(origin=(25, 10, 6), x_dir=(0, -1, 0), z_dir=(0, 0, -1)) * Cylinder(3, 28, mode=Mode.PRIVATE)
    add(fillet8_piece_2, mode=Mode.SUBTRACT)
    with BuildSketch(Plane(origin=(25, 6, 6), x_dir=(0, 1, 0), z_dir=(-1, 0, 0))) as fillet8_piece_3a_section:
        with BuildLine():
            CenterArc((1.732050808, -2), FILLET8_R, 90, 60)
            Line((0, -1), (0, 0))
            Line((0, 0), (1.732050808, 0))
        make_face()
    fillet8_piece_3a = extrude(amount=10.330127019, mode=Mode.PRIVATE)
    fillet8_piece_3a = split(fillet8_piece_3a, bisect_by=Plane(origin=(19, 6, 6), z_dir=(-1, 0, 0)), keep=Keep.TOP, mode=Mode.PRIVATE)
    with BuildSketch(Plane(origin=(19, 10.330127019, 6), x_dir=(-1, 0, 0), z_dir=(0, -1, 0))) as fillet8_piece_3b_section:
        with BuildLine():
            CenterArc((1.732050808, -2), FILLET8_R, 90, 60)
            Line((0, -1), (0, 0))
            Line((0, 0), (1.732050808, 0))
        make_face()
    fillet8_piece_3b = extrude(amount=10.330127019, mode=Mode.PRIVATE)
    fillet8_piece_3b = split(fillet8_piece_3b, bisect_by=Plane(origin=(19, 6, 6), z_dir=(0, 1, 0)), keep=Keep.TOP, mode=Mode.PRIVATE)
    fillet8_piece_3 = fillet8_piece_3a & fillet8_piece_3b
    add(fillet8_piece_3, mode=Mode.SUBTRACT)

    # Sketch46 → Cut-Extrude28 (cut)
    with BuildSketch(Plane.XY.offset(-6)):
        with Locations((21.074871131, 8)):
            Rectangle(SKETCH46_W, SKETCH46_H)
        with Locations((17, 3.925128869)):
            Rectangle(SKETCH46_W_2, SKETCH46_H_2)
    extrude(amount=-CUT_EXTRUDE28_DEPTH, mode=Mode.SUBTRACT)

    # Sketch43 → Cut-Extrude25 (cut)
    with BuildSketch(Plane.XY.offset(-4).offset(CUT_EXTRUDE25_START)):
        with BuildLine():
            Line((19, 0), (18, 0))
            ThreePointArc((18, 0), (17.121320344, 2.121320344), (15, 3))
            Line((15, 3), (19, 3))
            Line((19, 3), (19, 0))
        make_face()
    extrude(amount=CUT_EXTRUDE25_DEPTH, mode=Mode.SUBTRACT)

    # Sketch42 → Cut-Extrude24 (cut)
    with BuildSketch(Plane.XY.offset(-4).offset(CUT_EXTRUDE24_START)):
        with BuildLine():
            Line((22, 6), (25, 6))
            Line((25, 6), (25, 7))
            ThreePointArc((25, 7), (22.878679656, 7.878679656), (22, 10))
            Line((22, 10), (22, 6))
        make_face()
    extrude(amount=CUT_EXTRUDE24_DEPTH, mode=Mode.SUBTRACT)

    # Fillet9
    # the kernel refuses this fillet: 1 mm, written as the material it takes off along each edge
    with BuildSketch(Plane(origin=(21.392618485, 10, -7), x_dir=(1, 0, 0), z_dir=(0, 0, 1))) as fillet9_piece_1:
        with BuildLine():
            CenterArc((0.89509571, 0.957716316), FILLET9_R, 190.203399986, 63.075442435)
            Line((-0.089089388, 0.780573173), (-0.10877309, 0.77703031))
            ThreePointArc((-0.10877309, 0.77703031), (-0.051836033, 0.389454402), (-0.019975798, -0.000983607))
            Line((-0.019975798, -0.000983607), (0, -0.02))
            ThreePointArc((0, -0.02), (0.303690758, -0.02), (0.601627231, -0.019154326))
            Line((0.601627231, -0.019154326), (0.607381515, 0))
        make_face()
    extrude(amount=2.96410189, mode=Mode.SUBTRACT)
    with BuildSketch(Plane(origin=(15, 3.607381515, -7), x_dir=(0, -1, 0), z_dir=(0, 0, 1))) as fillet9_piece_2:
        with BuildLine():
            CenterArc((0.89509571, -0.957716316), FILLET9_R, 106.721157579, 63.075442435)
            Line((-0.089089388, -0.780573173), (-0.10877309, -0.77703031))
            ThreePointArc((-0.10877309, -0.77703031), (-0.051836033, -0.389454402), (-0.019975798, 0.000983607))
            Line((-0.019975798, 0.000983607), (0, 0.02))
            ThreePointArc((0, 0.02), (0.303690758, 0.02), (0.601627231, 0.019154326))
            Line((0.601627231, 0.019154326), (0.607381515, 0))
        make_face()
    extrude(amount=2.96410189, mode=Mode.SUBTRACT)

    # Fillet10
    fillet10_edges = [part.edges().sort_by_distance(p)[0] for p in [
        (11.815660034, 10.5, -3.25),
        (14.5, 13.184339966, -3.25),
    ]]
    fillet(fillet10_edges, radius=FILLET10_R)

    # Sketch47 → Boss-Extrude7 (add)
    with BuildSketch(Plane(origin=(0, 2.5, 0), x_dir=(1, 0, 0), z_dir=(0, 1, 0))):
        with Locations((19.5, 19.5)):
            Rectangle(SKETCH47_W, SKETCH47_H)
        with Locations((-19.5, 19.5)):
            Rectangle(SKETCH47_W, SKETCH47_H)
        with Locations((19.5, -19.5)):
            Rectangle(SKETCH47_W, SKETCH47_H)
        with Locations((-19.5, -19.5)):
            Rectangle(SKETCH47_W, SKETCH47_H)
    extrude(amount=BOSS_EXTRUDE7_DEPTH)

    # M1.6 Tapped Hole1
    with Locations(Plane(origin=(0, 38, 0), x_dir=(1, 0, 0), z_dir=(0, 1, 0))):
        with Locations((-20, -20), (-20, 20), (20, 20), (20, -20)):
            Hole(M1_6_TAPPED_HOLE1_D / 2, depth=M1_6_TAPPED_HOLE1_DEPTH)
            with Locations((0, 0, -(M1_6_TAPPED_HOLE1_DEPTH + M1_6_TAPPED_HOLE1_TIP / 2))):  # 118° drill point
                Cone(0, M1_6_TAPPED_HOLE1_D / 2, M1_6_TAPPED_HOLE1_TIP, mode=Mode.SUBTRACT)


solid = part.part
